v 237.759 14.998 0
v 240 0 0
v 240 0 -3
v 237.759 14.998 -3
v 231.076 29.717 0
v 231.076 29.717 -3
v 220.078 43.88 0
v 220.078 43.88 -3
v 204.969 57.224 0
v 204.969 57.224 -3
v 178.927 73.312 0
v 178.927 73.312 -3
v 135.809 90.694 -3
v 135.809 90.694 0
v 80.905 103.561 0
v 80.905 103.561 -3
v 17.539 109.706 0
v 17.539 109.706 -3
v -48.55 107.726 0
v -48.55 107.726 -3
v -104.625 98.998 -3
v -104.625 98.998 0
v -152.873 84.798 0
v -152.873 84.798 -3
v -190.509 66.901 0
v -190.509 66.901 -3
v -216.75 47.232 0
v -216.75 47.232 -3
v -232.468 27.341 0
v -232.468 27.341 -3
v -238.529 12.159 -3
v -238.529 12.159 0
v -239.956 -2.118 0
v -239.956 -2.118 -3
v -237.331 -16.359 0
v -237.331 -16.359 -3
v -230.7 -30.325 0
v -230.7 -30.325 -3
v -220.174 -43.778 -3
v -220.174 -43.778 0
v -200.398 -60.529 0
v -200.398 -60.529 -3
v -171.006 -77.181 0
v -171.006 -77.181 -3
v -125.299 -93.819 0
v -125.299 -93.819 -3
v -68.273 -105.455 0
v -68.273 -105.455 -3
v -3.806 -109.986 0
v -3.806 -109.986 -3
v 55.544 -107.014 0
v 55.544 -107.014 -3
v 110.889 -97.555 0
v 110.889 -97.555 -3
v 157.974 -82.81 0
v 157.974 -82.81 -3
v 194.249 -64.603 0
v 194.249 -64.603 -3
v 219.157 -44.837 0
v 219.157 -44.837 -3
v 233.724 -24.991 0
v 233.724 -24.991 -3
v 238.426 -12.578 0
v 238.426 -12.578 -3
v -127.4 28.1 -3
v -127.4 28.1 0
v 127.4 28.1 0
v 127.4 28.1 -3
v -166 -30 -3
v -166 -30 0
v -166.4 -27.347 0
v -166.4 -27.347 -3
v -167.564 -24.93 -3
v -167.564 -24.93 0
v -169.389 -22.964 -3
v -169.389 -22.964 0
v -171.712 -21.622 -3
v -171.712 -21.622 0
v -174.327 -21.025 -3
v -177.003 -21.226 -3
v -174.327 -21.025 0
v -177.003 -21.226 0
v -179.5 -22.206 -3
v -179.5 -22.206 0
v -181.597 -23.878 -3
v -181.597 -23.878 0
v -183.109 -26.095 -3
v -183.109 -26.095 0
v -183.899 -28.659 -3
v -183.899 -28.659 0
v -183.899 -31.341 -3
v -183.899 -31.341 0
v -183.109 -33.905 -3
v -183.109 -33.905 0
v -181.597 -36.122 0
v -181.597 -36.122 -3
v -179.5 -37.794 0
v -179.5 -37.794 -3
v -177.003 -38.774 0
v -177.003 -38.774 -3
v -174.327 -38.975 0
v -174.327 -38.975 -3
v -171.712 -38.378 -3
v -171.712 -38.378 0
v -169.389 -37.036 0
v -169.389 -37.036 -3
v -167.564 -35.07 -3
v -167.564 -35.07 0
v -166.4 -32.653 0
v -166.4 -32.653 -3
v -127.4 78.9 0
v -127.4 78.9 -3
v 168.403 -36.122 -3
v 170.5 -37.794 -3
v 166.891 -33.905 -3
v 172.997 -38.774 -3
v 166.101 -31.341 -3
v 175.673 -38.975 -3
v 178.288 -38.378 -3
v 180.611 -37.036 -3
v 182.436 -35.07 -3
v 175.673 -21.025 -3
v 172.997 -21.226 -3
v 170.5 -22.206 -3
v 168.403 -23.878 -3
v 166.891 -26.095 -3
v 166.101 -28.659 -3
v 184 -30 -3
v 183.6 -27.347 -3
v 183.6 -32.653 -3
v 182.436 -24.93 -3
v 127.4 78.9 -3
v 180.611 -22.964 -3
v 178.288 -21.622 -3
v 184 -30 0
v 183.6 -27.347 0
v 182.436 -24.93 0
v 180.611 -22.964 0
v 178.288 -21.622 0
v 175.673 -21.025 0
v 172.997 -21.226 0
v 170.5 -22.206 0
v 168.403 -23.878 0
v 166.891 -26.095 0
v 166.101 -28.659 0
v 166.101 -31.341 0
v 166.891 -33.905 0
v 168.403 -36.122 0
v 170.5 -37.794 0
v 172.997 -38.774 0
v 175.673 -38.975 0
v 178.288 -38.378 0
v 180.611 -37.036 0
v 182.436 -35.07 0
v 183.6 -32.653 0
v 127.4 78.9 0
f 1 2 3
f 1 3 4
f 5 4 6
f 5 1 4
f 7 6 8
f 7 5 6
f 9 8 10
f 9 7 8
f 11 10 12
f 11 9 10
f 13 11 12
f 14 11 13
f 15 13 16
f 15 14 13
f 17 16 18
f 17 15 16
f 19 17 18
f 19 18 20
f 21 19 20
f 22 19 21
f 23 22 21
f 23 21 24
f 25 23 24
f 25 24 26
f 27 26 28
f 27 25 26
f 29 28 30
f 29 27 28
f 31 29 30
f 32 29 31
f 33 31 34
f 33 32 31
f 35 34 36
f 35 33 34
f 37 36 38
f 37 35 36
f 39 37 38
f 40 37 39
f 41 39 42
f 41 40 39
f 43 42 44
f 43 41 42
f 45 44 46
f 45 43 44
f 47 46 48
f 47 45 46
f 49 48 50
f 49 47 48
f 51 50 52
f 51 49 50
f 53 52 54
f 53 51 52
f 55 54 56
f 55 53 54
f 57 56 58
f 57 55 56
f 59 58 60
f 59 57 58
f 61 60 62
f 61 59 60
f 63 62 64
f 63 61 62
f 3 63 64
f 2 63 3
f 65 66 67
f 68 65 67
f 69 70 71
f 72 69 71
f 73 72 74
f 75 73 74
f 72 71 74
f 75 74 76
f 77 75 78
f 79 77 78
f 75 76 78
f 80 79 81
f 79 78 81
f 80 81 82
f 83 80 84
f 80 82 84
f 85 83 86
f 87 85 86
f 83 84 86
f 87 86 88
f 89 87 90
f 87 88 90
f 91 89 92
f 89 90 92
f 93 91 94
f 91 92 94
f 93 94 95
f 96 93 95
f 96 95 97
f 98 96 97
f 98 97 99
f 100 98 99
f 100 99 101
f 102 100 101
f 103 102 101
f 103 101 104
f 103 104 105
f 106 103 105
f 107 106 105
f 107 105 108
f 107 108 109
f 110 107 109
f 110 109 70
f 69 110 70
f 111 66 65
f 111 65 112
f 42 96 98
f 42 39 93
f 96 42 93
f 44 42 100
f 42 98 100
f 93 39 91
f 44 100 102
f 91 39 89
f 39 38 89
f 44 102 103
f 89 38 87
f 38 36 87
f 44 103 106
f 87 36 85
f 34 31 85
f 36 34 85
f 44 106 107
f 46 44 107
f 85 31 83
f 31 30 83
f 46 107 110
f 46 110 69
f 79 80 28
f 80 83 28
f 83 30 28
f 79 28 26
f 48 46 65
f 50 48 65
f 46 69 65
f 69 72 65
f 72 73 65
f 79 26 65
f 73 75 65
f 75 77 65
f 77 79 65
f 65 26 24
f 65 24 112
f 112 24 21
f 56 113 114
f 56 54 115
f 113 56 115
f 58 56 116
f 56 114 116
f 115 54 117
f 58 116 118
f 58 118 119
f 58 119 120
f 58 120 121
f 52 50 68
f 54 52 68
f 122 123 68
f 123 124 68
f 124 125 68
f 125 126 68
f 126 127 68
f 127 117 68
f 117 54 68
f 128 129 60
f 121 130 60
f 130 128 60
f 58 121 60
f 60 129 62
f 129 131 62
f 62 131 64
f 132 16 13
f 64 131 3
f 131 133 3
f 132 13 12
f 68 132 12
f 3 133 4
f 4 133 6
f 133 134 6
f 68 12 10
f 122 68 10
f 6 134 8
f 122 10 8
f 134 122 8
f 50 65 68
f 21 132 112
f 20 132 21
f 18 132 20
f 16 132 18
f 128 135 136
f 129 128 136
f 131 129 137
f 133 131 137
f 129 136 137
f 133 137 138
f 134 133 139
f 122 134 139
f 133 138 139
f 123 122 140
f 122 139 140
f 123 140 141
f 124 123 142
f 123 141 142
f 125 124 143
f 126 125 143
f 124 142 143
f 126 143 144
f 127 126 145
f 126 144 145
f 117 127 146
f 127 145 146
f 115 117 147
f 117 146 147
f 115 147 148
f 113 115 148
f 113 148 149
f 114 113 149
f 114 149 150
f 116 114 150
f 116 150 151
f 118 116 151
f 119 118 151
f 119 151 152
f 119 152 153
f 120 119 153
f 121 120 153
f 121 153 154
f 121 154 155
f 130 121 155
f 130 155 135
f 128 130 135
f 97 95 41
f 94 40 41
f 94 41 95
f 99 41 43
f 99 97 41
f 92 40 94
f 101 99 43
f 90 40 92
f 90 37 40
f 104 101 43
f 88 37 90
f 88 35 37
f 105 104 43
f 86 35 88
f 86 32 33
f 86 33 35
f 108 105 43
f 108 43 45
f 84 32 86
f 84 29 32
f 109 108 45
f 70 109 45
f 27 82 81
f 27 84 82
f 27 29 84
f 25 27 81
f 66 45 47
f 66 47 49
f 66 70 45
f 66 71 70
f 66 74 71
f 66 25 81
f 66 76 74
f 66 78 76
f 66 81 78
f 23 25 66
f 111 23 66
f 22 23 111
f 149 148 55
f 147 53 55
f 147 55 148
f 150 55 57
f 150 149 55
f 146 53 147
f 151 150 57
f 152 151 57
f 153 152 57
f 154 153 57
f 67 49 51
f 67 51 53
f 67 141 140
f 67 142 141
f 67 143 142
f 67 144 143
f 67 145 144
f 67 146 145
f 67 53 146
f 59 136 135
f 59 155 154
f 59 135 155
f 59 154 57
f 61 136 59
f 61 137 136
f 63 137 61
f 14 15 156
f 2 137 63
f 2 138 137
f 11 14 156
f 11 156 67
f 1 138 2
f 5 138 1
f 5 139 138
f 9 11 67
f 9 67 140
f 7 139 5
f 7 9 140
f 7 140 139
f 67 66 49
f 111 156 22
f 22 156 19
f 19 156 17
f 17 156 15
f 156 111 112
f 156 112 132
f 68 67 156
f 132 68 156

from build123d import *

# Parameters (mm, degrees)
SKETCH1_RX          = 240
SKETCH1_RY          = 110
BOSS_EXTRUDE1_DEPTH = 3
SKETCH10_W          = 254.8
SKETCH10_H          = 50.8
CUT_EXTRUDE5_DEPTH  = 4
SKETCH12_R          = 9
CUT_EXTRUDE8_DEPTH  = 4


with BuildPart() as part:
    # Sketch1 → Boss-Extrude1 (new body)
    with BuildSketch(Plane.XY):
        with Locations((0, 0)):
            Ellipse(SKETCH1_RX, SKETCH1_RY)
    extrude(amount=-BOSS_EXTRUDE1_DEPTH)

    # Sketch10 → Cut-Extrude5 (cut, through all)
    with BuildSketch(Plane.XY):
        with Locations((0, 53.5)):
            Rectangle(SKETCH10_W, SKETCH10_H)
    extrude(amount=-CUT_EXTRUDE5_DEPTH, mode=Mode.SUBTRACT)

    # Sketch12 → Cut-Extrude8 (cut, through all)
    with BuildSketch(Plane.XY):
        with Locations((175, -30)):
            Circle(SKETCH12_R)
        with Locations((-175, -30)):
            Circle(SKETCH12_R)
    extrude(amount=-CUT_EXTRUDE8_DEPTH, mode=Mode.SUBTRACT)


solid = part.part
